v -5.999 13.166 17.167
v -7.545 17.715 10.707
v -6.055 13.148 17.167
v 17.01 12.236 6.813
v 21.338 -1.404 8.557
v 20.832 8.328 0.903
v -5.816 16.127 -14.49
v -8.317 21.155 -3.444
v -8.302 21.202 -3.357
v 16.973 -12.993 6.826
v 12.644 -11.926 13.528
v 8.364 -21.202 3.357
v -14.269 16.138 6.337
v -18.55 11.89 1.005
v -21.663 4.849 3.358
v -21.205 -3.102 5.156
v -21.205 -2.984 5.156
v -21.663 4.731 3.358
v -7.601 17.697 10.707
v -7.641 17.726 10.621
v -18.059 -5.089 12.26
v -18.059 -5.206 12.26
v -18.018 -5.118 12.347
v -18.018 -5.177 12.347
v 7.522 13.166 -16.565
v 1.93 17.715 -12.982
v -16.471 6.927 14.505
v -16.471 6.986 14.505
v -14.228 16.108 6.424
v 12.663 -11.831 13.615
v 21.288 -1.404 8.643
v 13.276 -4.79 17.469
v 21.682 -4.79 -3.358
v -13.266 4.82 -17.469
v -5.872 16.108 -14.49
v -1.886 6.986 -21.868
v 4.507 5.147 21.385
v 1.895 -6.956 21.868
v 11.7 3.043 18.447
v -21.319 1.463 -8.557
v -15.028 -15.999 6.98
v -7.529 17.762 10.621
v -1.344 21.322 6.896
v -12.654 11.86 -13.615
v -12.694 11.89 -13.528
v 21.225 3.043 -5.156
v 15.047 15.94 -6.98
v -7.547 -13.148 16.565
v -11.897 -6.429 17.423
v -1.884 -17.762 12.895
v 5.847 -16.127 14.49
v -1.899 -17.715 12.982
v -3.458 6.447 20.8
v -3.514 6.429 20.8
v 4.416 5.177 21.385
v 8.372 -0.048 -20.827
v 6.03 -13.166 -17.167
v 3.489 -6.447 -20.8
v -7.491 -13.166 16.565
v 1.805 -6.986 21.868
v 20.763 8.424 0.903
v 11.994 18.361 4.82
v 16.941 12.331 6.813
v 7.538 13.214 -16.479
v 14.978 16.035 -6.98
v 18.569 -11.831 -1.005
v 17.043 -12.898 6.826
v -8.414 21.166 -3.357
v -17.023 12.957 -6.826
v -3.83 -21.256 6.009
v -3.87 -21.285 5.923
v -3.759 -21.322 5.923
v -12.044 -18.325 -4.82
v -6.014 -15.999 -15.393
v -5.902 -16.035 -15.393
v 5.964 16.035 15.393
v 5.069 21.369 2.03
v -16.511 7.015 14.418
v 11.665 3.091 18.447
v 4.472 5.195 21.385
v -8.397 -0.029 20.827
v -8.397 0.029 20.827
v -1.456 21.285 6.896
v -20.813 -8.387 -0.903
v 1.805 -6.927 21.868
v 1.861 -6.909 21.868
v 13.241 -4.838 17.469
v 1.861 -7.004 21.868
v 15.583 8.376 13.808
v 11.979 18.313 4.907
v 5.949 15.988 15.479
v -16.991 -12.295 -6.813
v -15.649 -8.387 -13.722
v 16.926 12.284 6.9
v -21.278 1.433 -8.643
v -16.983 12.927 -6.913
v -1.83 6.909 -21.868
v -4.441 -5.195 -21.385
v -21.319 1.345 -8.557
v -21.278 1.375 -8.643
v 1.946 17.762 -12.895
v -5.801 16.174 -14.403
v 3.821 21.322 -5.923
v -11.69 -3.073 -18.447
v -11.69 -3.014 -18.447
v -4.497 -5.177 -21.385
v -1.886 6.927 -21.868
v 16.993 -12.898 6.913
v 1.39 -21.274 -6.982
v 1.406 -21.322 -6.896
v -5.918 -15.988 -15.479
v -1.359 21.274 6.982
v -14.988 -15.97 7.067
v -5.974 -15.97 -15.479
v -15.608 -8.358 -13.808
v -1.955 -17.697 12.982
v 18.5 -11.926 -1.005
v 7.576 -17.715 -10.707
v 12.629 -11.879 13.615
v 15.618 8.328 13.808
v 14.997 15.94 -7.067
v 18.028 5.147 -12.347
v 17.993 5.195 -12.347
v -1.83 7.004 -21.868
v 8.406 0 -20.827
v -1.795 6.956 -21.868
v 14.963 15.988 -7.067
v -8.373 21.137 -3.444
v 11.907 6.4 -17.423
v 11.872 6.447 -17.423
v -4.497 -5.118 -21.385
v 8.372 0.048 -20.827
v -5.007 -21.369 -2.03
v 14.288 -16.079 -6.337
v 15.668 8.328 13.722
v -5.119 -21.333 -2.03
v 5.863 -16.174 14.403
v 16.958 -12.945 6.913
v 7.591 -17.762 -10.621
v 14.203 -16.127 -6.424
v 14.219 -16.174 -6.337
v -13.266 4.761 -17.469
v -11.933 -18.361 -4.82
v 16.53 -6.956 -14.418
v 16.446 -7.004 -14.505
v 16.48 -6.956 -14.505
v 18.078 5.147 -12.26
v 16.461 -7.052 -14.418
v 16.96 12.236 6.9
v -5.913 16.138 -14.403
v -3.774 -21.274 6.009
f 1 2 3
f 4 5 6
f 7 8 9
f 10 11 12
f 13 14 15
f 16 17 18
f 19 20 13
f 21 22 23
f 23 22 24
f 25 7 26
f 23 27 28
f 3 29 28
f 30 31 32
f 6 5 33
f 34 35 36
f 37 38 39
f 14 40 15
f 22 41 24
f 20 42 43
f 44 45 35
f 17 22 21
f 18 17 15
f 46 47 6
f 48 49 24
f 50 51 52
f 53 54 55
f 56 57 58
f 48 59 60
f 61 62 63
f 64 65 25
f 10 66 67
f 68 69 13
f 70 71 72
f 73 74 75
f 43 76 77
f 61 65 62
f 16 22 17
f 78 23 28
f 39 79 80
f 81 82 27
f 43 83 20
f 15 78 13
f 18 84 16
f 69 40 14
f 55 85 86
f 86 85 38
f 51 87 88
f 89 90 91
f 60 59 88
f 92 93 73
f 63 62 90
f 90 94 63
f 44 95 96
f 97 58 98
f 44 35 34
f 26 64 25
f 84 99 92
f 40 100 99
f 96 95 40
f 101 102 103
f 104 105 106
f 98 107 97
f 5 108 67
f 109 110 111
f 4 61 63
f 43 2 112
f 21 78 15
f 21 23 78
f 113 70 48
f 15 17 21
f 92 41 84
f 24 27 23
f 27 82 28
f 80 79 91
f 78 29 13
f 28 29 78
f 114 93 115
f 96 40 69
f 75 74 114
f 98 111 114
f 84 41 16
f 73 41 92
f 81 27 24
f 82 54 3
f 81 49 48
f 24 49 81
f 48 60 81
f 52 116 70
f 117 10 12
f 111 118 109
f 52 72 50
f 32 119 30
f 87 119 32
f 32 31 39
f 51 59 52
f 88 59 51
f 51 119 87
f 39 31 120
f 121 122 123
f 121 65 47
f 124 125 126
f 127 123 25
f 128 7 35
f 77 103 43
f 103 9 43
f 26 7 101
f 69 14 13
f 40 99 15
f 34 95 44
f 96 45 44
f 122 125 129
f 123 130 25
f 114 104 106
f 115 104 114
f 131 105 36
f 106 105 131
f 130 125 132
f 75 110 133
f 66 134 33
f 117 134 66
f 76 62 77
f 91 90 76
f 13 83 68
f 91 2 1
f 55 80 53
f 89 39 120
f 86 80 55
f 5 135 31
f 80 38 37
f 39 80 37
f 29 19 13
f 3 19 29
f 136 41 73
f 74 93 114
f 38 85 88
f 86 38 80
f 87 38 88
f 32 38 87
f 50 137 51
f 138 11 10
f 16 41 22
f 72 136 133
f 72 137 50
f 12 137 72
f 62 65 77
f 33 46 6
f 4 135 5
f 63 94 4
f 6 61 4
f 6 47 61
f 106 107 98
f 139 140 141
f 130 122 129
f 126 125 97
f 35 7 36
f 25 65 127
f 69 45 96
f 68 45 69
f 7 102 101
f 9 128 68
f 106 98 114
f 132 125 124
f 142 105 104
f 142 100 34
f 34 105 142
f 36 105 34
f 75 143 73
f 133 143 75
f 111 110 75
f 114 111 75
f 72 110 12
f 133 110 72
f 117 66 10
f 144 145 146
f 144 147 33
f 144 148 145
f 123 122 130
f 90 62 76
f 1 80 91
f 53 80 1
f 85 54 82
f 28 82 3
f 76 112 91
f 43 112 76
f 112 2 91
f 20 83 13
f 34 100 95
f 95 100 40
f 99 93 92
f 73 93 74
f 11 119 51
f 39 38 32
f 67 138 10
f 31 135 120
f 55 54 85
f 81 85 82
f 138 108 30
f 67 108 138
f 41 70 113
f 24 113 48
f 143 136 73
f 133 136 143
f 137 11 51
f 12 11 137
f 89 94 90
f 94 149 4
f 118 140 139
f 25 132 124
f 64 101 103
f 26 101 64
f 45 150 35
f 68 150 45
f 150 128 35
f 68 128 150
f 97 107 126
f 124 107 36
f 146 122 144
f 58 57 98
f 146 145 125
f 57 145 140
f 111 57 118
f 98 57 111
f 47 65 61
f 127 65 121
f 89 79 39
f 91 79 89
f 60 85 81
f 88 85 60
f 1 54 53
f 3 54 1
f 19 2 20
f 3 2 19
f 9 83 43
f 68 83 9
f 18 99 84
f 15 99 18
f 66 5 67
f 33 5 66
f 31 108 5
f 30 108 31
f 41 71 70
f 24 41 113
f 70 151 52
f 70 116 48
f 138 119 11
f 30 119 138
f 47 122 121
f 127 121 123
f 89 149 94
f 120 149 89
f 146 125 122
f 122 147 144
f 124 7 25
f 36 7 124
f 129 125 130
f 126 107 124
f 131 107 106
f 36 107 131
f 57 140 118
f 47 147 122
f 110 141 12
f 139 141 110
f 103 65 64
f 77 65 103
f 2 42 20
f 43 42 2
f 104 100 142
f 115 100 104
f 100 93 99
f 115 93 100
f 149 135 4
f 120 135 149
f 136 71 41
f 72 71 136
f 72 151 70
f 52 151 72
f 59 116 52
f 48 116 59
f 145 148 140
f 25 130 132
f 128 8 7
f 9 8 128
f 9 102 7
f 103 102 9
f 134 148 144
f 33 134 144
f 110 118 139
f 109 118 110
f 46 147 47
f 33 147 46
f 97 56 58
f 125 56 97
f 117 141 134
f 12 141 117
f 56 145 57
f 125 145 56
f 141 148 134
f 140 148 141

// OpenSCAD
// Auto-generated OpenSCAD file

    inner_points = 10*[[2.1581840087637554, -0.47901391554255596, -0.3358384329301779], [-2.1581840087637554, 0.47901391554255585, 0.3358384329301779], [0.44568059676330724, 0.5147293452813884, 2.1298879094391086], [-0.44568059676330724, -0.5147293452813884, -2.1298879094391086], [-0.3789598791232536, -2.1226397173855918, 0.592275307768361], [0.3789598791232536, 2.1226397173855918, -0.592275307768361], [1.8468994002772836, -1.1831092474237024, -0.10054340306152984], [-2.1124539485061335, -0.30432164501547615, 0.5155778445581074], [2.1124539485061335, 0.30432164501547604, -0.5155778445581074], [-1.8468994002772836, 1.1831092474237024, 0.10054340306152984], [1.1649867448798608, 0.30432164501550785, 1.8360523093344985], [-0.3473516608846876, 0.6399886402434213, 2.0713896847342097], [0.3473516608846876, -0.6399886402434213, -2.0713896847342097], [-1.1649867448798608, -0.30432164501550796, -1.8360523093344985], [-0.19146101071923538, -1.7667250996397783, 1.2895421535027258], [0.5037698224110163, 2.1274195326825804, 0.20296787916285575], [-0.5037698224110163, -2.1274195326825804, -0.20296787916285575], [0.19146101071923538, 1.7667250996397783, -1.2895421535027258], [2.1237751475364597, -0.14040837876743853, 0.8556648658534093], [-1.6430242450768815, 0.6956414292156163, 1.441822487279881], [1.6430242450768815, -0.6956414292156163, -1.441822487279881], [-2.1237751475364597, 0.14040837876743847, -0.8556648658534093], [0.18454566188623295, -0.6956414292155677, 2.1781468392685186], [0.5933256384155501, 1.5940273765180046, 1.539265786824177], [-0.5933256384155501, -1.5940273765180046, -1.539265786824177], [-0.18454566188623295, 0.6956414292155677, -2.1781468392685186], [0.8332950787463423, -2.1107345741393253, 0.3357329624084479], [-1.4947149746911619, -1.5940273765179742, 0.6979982952148012], [1.4947149746911619, 1.5940273765179742, -0.6979982952148012], [-0.8332950787463423, 2.1107345741393253, -0.3357329624084479], [1.6942504789795316, -1.2897901417133697, 0.6826102144098292], [-1.7977646011767252, -0.5147293452813434, 1.2260082136193589], [2.073210358102785, 0.8328495756722215, 0.09033490664146815], [-1.4188047220534714, 1.607910372104248, 0.633732905850998], [1.4188047220534714, -1.607910372104248, -0.633732905850998], [-2.073210358102785, -0.8328495756722215, -0.09033490664146815], [1.7977646011767252, 0.5147293452813434, -1.2260082136193589], [-1.6942504789795316, 1.2897901417133697, -0.6826102144098292], [1.3225501383912004, -0.4790139155425279, 1.7382194338339545], [-0.8356338703725551, 2.7783012117286574e-14, 2.0740578667641327], [1.5567602240619225, 0.8328495756722388, 1.372173162935803], [-0.6014237847018329, 1.3118634912147946, 1.708011595865981], [0.6014237847018329, -1.3118634912147946, -1.708011595865981], [-1.5567602240619225, -0.8328495756722388, -1.372173162935803], [0.8356338703725551, -2.783916141643377e-14, -2.0740578667641327], [-1.3225501383912004, 0.4790139155425278, -1.7382194338339545], [0.5831708516809165, -1.6079103721042203, 1.4403249609131346], [-0.7506602197115849, -1.311863491214749, 1.6478845271924865], [1.1963408164748919, 1.8265928364961375, 0.4820033822466221], [-0.13749025491760924, 2.1226397173856086, 0.689562948525974], [0.13749025491760924, -2.1226397173856086, -0.689562948525974], [-1.1963408164748919, -1.8265928364961375, -0.4820033822466221], [0.7506602197115849, 1.311863491214749, -1.6478845271924865], [-0.5831708516809165, 1.6079103721042203, -1.4403249609131346], [1.2613324652104296, -1.1831092474236833, 1.3528439610132468], [-1.1856824778084398, -0.6399886402433701, 1.733627833233173], [1.6910087501118318, 1.223604492459497, 0.6813041281699542], [-0.7560061929070375, 1.7667250996398103, 1.0620880003898803], [0.7560061929070375, -1.7667250996398103, -1.0620880003898803], [-1.6910087501118318, -1.223604492459497, -0.6813041281699542], [1.1856824778084398, 0.6399886402433701, -1.733627833233173], [-1.2613324652104296, 1.1831092474236833, -1.3528439610132468]];

    outer_points = 10*[[2.0504035747429623, -0.3367462235081423, -0.8261036022402306], [-2.0504035747429623, 0.3367462235081423, 0.8261036022402306], [0.8356338703727036, 0.0, 2.0740578667640728], [-0.8356338703727036, 0.0, -2.0740578667640728], [-0.31234790757617786, -2.210565986563849, 0.12584436292412624], [0.31234790757617786, 2.210565986563849, -0.12584436292412624], [1.7713727125167815, -1.0834157580412187, -0.7136826119236575], [-1.990249200651931, -0.46562909929340035, 0.8018675222122601], [1.990249200651931, 0.46562909929340035, -0.8018675222122601], [-1.7713727125167815, 1.0834157580412187, 0.7136826119236575], [1.484922928348721, -0.117986752922717, 1.6130644391909073], [0.04811121034467869, 0.117986752922717, 2.1919530787763652], [-0.04811121034467869, -0.117986752922717, -2.1919530787763652], [-1.484922928348721, 0.117986752922717, -1.6130644391909073], [0.0062704248954620345, -2.0277260433001323, 0.8421292282525781], [0.5792965101714963, 2.0277260433001323, 0.6112581358221563], [-0.5792965101714963, -2.0277260433001323, -0.6112581358221563], [-0.0062704248954620345, 2.0277260433001323, -0.8421292282525781], [2.24003675124834, -0.29387101957582845, 0.39770960472157424], [-1.3386474149725676, 0.29387101957582845, 1.8395544773173393], [1.3386474149725676, -0.29387101957582845, -1.8395544773173393], [-2.24003675124834, 0.29387101957582845, -0.39770960472157424], [0.5607761146710651, -1.1922569668782506, 1.8778581487754187], [0.8977024685198428, 1.1922569668782506, 1.7421111777728766], [-0.8977024685198428, -1.1922569668782506, -1.7421111777728766], [-0.5607761146710651, 1.1922569668782506, -1.8778581487754187], [0.8332950787463514, -2.1107345741393146, -0.3357329624084925], [-1.3784533709792477, -1.7474900173264192, 0.5553761753604523], [1.3784533709792477, 1.7474900173264192, -0.5553761753604523], [-0.8332950787463514, 2.1107345741393146, 0.3357329624084925], [1.7608624505265877, -1.3777164108915962, 0.03550945628250357], [-1.556760224061811, -0.832849575672253, 1.3721731629359204], [2.0732103581027657, 0.832849575672253, -0.09033490664162269], [-1.244412316485633, 1.3777164108915962, 1.2463288000117942], [1.244412316485633, -1.3777164108915962, -1.2463288000117942], [-2.0732103581027657, -0.832849575672253, 0.09033490664162269], [1.556760224061811, 0.832849575672253, -1.3721731629359204], [-1.7608624505265877, 1.3777164108915962, -0.03550945628250357], [1.604722977979816, -0.8514755687895221, 1.3037843071989137], [-0.4456805967631464, -0.5147293452813799, 2.129887909439144], [1.7977646011768047, 0.5147293452813799, 1.2260082136192265], [-0.2526389735661577, 0.8514755687895221, 2.052111815859457], [0.2526389735661577, -0.8514755687895221, -2.052111815859457], [-1.7977646011768047, -0.5147293452813799, -1.2260082136192265], [0.4456805967631464, 0.5147293452813799, -2.129887909439144], [-1.604722977979816, 0.8514755687895221, -1.3037843071989137], [0.7987317197224866, -1.8924457561729762, 0.8835591094273499], [-0.4684873801229495, -1.6843251444617753, 1.3941192138405363], [1.3041212504956532, 1.6843251444617753, 0.6799386529235366], [0.03690215065021707, 1.8924457561729762, 1.190498757336723], [-0.03690215065021707, -1.8924457561729762, -1.190498757336723], [-1.3041212504956532, -1.6843251444617753, -0.6799386529235366], [0.4684873801229495, 1.6843251444617753, -1.3941192138405363], [-0.7987317197224866, 1.8924457561729762, -0.8835591094273499], [1.4590639008251134, -1.444110191084015, 0.7788274207419489], [-0.8657462943395569, -1.0622970381816308, 1.7154889152924082], [1.8132134979659984, 1.0622970381816308, 0.6361412386001297], [-0.5115966971986718, 1.444110191084015, 1.572802733150589], [0.5115966971986718, -1.444110191084015, -1.572802733150589], [-1.8132134979659984, -1.0622970381816308, -0.6361412386001297], [0.8657462943395569, 1.0622970381816308, -1.7154889152924082], [-1.4590639008251134, 1.444110191084015, -0.7788274207419489]];

    // Convex hull for inner set (I)
    module inner_hull() {
        hull() {
            for (p = inner_points) {
                translate(p) sphere(r=0.1);
            }
        }
    }

    // Convex hull for outer set (O) minus inner hull (O \ I)
    module outer_minus_inner() {
        difference() {
            hull() {
                for (p = outer_points) {
                    translate(p) sphere(r=0.1);
                }
            }
            inner_hull(); // Subtract inner hull
        }
    }

    // Convex hull for outer set (O) minus all translated inner hulls
    module outer_minus_AllTranslationInner() {
        difference() {
            hull() {
                for (p = outer_points) {
                    translate(p) sphere(r=0.1);
                }
            }
            hull() {
                translate([0,0,50]) inner_hull();
                translate([0,0,-50]) inner_hull();
            }; // Subtract translated inner hulls
        }
    }

    // Difference between outer_minus_inner and outer_minus_AllTranslationInner
    module outer_minus_inner_diff() {
        difference() {
            // Outer minus inner
            difference() {
                hull() {
                    for (p = outer_points) {
                        translate(p) sphere(r=0.1);
                    }
                }
                inner_hull();
            }

            // Subtract Outer minus AllTranslationInner
            difference() {
                hull() {
                    for (p = outer_points) {
                        translate(p) sphere(r=0.1);
                    }
                }
                hull() {
                    translate([0,0,5]) inner_hull();
                    translate([0,0,-5]) inner_hull();
                };
            }
        }
    }

    // Rendering all with colors applied
    color([1, 0, 0, 0.5]) inner_hull(); // Transparent red
    // color([0, 0, 1, 1]) outer_minus_inner(); // Opaque blue
    // color([0, 1, 0, 1]) outer_minus_AllTranslationInner(); // Opaque green
    // color([1, 1, 0, 1]) outer_minus_inner_diff(); // Opaque yellow
    
